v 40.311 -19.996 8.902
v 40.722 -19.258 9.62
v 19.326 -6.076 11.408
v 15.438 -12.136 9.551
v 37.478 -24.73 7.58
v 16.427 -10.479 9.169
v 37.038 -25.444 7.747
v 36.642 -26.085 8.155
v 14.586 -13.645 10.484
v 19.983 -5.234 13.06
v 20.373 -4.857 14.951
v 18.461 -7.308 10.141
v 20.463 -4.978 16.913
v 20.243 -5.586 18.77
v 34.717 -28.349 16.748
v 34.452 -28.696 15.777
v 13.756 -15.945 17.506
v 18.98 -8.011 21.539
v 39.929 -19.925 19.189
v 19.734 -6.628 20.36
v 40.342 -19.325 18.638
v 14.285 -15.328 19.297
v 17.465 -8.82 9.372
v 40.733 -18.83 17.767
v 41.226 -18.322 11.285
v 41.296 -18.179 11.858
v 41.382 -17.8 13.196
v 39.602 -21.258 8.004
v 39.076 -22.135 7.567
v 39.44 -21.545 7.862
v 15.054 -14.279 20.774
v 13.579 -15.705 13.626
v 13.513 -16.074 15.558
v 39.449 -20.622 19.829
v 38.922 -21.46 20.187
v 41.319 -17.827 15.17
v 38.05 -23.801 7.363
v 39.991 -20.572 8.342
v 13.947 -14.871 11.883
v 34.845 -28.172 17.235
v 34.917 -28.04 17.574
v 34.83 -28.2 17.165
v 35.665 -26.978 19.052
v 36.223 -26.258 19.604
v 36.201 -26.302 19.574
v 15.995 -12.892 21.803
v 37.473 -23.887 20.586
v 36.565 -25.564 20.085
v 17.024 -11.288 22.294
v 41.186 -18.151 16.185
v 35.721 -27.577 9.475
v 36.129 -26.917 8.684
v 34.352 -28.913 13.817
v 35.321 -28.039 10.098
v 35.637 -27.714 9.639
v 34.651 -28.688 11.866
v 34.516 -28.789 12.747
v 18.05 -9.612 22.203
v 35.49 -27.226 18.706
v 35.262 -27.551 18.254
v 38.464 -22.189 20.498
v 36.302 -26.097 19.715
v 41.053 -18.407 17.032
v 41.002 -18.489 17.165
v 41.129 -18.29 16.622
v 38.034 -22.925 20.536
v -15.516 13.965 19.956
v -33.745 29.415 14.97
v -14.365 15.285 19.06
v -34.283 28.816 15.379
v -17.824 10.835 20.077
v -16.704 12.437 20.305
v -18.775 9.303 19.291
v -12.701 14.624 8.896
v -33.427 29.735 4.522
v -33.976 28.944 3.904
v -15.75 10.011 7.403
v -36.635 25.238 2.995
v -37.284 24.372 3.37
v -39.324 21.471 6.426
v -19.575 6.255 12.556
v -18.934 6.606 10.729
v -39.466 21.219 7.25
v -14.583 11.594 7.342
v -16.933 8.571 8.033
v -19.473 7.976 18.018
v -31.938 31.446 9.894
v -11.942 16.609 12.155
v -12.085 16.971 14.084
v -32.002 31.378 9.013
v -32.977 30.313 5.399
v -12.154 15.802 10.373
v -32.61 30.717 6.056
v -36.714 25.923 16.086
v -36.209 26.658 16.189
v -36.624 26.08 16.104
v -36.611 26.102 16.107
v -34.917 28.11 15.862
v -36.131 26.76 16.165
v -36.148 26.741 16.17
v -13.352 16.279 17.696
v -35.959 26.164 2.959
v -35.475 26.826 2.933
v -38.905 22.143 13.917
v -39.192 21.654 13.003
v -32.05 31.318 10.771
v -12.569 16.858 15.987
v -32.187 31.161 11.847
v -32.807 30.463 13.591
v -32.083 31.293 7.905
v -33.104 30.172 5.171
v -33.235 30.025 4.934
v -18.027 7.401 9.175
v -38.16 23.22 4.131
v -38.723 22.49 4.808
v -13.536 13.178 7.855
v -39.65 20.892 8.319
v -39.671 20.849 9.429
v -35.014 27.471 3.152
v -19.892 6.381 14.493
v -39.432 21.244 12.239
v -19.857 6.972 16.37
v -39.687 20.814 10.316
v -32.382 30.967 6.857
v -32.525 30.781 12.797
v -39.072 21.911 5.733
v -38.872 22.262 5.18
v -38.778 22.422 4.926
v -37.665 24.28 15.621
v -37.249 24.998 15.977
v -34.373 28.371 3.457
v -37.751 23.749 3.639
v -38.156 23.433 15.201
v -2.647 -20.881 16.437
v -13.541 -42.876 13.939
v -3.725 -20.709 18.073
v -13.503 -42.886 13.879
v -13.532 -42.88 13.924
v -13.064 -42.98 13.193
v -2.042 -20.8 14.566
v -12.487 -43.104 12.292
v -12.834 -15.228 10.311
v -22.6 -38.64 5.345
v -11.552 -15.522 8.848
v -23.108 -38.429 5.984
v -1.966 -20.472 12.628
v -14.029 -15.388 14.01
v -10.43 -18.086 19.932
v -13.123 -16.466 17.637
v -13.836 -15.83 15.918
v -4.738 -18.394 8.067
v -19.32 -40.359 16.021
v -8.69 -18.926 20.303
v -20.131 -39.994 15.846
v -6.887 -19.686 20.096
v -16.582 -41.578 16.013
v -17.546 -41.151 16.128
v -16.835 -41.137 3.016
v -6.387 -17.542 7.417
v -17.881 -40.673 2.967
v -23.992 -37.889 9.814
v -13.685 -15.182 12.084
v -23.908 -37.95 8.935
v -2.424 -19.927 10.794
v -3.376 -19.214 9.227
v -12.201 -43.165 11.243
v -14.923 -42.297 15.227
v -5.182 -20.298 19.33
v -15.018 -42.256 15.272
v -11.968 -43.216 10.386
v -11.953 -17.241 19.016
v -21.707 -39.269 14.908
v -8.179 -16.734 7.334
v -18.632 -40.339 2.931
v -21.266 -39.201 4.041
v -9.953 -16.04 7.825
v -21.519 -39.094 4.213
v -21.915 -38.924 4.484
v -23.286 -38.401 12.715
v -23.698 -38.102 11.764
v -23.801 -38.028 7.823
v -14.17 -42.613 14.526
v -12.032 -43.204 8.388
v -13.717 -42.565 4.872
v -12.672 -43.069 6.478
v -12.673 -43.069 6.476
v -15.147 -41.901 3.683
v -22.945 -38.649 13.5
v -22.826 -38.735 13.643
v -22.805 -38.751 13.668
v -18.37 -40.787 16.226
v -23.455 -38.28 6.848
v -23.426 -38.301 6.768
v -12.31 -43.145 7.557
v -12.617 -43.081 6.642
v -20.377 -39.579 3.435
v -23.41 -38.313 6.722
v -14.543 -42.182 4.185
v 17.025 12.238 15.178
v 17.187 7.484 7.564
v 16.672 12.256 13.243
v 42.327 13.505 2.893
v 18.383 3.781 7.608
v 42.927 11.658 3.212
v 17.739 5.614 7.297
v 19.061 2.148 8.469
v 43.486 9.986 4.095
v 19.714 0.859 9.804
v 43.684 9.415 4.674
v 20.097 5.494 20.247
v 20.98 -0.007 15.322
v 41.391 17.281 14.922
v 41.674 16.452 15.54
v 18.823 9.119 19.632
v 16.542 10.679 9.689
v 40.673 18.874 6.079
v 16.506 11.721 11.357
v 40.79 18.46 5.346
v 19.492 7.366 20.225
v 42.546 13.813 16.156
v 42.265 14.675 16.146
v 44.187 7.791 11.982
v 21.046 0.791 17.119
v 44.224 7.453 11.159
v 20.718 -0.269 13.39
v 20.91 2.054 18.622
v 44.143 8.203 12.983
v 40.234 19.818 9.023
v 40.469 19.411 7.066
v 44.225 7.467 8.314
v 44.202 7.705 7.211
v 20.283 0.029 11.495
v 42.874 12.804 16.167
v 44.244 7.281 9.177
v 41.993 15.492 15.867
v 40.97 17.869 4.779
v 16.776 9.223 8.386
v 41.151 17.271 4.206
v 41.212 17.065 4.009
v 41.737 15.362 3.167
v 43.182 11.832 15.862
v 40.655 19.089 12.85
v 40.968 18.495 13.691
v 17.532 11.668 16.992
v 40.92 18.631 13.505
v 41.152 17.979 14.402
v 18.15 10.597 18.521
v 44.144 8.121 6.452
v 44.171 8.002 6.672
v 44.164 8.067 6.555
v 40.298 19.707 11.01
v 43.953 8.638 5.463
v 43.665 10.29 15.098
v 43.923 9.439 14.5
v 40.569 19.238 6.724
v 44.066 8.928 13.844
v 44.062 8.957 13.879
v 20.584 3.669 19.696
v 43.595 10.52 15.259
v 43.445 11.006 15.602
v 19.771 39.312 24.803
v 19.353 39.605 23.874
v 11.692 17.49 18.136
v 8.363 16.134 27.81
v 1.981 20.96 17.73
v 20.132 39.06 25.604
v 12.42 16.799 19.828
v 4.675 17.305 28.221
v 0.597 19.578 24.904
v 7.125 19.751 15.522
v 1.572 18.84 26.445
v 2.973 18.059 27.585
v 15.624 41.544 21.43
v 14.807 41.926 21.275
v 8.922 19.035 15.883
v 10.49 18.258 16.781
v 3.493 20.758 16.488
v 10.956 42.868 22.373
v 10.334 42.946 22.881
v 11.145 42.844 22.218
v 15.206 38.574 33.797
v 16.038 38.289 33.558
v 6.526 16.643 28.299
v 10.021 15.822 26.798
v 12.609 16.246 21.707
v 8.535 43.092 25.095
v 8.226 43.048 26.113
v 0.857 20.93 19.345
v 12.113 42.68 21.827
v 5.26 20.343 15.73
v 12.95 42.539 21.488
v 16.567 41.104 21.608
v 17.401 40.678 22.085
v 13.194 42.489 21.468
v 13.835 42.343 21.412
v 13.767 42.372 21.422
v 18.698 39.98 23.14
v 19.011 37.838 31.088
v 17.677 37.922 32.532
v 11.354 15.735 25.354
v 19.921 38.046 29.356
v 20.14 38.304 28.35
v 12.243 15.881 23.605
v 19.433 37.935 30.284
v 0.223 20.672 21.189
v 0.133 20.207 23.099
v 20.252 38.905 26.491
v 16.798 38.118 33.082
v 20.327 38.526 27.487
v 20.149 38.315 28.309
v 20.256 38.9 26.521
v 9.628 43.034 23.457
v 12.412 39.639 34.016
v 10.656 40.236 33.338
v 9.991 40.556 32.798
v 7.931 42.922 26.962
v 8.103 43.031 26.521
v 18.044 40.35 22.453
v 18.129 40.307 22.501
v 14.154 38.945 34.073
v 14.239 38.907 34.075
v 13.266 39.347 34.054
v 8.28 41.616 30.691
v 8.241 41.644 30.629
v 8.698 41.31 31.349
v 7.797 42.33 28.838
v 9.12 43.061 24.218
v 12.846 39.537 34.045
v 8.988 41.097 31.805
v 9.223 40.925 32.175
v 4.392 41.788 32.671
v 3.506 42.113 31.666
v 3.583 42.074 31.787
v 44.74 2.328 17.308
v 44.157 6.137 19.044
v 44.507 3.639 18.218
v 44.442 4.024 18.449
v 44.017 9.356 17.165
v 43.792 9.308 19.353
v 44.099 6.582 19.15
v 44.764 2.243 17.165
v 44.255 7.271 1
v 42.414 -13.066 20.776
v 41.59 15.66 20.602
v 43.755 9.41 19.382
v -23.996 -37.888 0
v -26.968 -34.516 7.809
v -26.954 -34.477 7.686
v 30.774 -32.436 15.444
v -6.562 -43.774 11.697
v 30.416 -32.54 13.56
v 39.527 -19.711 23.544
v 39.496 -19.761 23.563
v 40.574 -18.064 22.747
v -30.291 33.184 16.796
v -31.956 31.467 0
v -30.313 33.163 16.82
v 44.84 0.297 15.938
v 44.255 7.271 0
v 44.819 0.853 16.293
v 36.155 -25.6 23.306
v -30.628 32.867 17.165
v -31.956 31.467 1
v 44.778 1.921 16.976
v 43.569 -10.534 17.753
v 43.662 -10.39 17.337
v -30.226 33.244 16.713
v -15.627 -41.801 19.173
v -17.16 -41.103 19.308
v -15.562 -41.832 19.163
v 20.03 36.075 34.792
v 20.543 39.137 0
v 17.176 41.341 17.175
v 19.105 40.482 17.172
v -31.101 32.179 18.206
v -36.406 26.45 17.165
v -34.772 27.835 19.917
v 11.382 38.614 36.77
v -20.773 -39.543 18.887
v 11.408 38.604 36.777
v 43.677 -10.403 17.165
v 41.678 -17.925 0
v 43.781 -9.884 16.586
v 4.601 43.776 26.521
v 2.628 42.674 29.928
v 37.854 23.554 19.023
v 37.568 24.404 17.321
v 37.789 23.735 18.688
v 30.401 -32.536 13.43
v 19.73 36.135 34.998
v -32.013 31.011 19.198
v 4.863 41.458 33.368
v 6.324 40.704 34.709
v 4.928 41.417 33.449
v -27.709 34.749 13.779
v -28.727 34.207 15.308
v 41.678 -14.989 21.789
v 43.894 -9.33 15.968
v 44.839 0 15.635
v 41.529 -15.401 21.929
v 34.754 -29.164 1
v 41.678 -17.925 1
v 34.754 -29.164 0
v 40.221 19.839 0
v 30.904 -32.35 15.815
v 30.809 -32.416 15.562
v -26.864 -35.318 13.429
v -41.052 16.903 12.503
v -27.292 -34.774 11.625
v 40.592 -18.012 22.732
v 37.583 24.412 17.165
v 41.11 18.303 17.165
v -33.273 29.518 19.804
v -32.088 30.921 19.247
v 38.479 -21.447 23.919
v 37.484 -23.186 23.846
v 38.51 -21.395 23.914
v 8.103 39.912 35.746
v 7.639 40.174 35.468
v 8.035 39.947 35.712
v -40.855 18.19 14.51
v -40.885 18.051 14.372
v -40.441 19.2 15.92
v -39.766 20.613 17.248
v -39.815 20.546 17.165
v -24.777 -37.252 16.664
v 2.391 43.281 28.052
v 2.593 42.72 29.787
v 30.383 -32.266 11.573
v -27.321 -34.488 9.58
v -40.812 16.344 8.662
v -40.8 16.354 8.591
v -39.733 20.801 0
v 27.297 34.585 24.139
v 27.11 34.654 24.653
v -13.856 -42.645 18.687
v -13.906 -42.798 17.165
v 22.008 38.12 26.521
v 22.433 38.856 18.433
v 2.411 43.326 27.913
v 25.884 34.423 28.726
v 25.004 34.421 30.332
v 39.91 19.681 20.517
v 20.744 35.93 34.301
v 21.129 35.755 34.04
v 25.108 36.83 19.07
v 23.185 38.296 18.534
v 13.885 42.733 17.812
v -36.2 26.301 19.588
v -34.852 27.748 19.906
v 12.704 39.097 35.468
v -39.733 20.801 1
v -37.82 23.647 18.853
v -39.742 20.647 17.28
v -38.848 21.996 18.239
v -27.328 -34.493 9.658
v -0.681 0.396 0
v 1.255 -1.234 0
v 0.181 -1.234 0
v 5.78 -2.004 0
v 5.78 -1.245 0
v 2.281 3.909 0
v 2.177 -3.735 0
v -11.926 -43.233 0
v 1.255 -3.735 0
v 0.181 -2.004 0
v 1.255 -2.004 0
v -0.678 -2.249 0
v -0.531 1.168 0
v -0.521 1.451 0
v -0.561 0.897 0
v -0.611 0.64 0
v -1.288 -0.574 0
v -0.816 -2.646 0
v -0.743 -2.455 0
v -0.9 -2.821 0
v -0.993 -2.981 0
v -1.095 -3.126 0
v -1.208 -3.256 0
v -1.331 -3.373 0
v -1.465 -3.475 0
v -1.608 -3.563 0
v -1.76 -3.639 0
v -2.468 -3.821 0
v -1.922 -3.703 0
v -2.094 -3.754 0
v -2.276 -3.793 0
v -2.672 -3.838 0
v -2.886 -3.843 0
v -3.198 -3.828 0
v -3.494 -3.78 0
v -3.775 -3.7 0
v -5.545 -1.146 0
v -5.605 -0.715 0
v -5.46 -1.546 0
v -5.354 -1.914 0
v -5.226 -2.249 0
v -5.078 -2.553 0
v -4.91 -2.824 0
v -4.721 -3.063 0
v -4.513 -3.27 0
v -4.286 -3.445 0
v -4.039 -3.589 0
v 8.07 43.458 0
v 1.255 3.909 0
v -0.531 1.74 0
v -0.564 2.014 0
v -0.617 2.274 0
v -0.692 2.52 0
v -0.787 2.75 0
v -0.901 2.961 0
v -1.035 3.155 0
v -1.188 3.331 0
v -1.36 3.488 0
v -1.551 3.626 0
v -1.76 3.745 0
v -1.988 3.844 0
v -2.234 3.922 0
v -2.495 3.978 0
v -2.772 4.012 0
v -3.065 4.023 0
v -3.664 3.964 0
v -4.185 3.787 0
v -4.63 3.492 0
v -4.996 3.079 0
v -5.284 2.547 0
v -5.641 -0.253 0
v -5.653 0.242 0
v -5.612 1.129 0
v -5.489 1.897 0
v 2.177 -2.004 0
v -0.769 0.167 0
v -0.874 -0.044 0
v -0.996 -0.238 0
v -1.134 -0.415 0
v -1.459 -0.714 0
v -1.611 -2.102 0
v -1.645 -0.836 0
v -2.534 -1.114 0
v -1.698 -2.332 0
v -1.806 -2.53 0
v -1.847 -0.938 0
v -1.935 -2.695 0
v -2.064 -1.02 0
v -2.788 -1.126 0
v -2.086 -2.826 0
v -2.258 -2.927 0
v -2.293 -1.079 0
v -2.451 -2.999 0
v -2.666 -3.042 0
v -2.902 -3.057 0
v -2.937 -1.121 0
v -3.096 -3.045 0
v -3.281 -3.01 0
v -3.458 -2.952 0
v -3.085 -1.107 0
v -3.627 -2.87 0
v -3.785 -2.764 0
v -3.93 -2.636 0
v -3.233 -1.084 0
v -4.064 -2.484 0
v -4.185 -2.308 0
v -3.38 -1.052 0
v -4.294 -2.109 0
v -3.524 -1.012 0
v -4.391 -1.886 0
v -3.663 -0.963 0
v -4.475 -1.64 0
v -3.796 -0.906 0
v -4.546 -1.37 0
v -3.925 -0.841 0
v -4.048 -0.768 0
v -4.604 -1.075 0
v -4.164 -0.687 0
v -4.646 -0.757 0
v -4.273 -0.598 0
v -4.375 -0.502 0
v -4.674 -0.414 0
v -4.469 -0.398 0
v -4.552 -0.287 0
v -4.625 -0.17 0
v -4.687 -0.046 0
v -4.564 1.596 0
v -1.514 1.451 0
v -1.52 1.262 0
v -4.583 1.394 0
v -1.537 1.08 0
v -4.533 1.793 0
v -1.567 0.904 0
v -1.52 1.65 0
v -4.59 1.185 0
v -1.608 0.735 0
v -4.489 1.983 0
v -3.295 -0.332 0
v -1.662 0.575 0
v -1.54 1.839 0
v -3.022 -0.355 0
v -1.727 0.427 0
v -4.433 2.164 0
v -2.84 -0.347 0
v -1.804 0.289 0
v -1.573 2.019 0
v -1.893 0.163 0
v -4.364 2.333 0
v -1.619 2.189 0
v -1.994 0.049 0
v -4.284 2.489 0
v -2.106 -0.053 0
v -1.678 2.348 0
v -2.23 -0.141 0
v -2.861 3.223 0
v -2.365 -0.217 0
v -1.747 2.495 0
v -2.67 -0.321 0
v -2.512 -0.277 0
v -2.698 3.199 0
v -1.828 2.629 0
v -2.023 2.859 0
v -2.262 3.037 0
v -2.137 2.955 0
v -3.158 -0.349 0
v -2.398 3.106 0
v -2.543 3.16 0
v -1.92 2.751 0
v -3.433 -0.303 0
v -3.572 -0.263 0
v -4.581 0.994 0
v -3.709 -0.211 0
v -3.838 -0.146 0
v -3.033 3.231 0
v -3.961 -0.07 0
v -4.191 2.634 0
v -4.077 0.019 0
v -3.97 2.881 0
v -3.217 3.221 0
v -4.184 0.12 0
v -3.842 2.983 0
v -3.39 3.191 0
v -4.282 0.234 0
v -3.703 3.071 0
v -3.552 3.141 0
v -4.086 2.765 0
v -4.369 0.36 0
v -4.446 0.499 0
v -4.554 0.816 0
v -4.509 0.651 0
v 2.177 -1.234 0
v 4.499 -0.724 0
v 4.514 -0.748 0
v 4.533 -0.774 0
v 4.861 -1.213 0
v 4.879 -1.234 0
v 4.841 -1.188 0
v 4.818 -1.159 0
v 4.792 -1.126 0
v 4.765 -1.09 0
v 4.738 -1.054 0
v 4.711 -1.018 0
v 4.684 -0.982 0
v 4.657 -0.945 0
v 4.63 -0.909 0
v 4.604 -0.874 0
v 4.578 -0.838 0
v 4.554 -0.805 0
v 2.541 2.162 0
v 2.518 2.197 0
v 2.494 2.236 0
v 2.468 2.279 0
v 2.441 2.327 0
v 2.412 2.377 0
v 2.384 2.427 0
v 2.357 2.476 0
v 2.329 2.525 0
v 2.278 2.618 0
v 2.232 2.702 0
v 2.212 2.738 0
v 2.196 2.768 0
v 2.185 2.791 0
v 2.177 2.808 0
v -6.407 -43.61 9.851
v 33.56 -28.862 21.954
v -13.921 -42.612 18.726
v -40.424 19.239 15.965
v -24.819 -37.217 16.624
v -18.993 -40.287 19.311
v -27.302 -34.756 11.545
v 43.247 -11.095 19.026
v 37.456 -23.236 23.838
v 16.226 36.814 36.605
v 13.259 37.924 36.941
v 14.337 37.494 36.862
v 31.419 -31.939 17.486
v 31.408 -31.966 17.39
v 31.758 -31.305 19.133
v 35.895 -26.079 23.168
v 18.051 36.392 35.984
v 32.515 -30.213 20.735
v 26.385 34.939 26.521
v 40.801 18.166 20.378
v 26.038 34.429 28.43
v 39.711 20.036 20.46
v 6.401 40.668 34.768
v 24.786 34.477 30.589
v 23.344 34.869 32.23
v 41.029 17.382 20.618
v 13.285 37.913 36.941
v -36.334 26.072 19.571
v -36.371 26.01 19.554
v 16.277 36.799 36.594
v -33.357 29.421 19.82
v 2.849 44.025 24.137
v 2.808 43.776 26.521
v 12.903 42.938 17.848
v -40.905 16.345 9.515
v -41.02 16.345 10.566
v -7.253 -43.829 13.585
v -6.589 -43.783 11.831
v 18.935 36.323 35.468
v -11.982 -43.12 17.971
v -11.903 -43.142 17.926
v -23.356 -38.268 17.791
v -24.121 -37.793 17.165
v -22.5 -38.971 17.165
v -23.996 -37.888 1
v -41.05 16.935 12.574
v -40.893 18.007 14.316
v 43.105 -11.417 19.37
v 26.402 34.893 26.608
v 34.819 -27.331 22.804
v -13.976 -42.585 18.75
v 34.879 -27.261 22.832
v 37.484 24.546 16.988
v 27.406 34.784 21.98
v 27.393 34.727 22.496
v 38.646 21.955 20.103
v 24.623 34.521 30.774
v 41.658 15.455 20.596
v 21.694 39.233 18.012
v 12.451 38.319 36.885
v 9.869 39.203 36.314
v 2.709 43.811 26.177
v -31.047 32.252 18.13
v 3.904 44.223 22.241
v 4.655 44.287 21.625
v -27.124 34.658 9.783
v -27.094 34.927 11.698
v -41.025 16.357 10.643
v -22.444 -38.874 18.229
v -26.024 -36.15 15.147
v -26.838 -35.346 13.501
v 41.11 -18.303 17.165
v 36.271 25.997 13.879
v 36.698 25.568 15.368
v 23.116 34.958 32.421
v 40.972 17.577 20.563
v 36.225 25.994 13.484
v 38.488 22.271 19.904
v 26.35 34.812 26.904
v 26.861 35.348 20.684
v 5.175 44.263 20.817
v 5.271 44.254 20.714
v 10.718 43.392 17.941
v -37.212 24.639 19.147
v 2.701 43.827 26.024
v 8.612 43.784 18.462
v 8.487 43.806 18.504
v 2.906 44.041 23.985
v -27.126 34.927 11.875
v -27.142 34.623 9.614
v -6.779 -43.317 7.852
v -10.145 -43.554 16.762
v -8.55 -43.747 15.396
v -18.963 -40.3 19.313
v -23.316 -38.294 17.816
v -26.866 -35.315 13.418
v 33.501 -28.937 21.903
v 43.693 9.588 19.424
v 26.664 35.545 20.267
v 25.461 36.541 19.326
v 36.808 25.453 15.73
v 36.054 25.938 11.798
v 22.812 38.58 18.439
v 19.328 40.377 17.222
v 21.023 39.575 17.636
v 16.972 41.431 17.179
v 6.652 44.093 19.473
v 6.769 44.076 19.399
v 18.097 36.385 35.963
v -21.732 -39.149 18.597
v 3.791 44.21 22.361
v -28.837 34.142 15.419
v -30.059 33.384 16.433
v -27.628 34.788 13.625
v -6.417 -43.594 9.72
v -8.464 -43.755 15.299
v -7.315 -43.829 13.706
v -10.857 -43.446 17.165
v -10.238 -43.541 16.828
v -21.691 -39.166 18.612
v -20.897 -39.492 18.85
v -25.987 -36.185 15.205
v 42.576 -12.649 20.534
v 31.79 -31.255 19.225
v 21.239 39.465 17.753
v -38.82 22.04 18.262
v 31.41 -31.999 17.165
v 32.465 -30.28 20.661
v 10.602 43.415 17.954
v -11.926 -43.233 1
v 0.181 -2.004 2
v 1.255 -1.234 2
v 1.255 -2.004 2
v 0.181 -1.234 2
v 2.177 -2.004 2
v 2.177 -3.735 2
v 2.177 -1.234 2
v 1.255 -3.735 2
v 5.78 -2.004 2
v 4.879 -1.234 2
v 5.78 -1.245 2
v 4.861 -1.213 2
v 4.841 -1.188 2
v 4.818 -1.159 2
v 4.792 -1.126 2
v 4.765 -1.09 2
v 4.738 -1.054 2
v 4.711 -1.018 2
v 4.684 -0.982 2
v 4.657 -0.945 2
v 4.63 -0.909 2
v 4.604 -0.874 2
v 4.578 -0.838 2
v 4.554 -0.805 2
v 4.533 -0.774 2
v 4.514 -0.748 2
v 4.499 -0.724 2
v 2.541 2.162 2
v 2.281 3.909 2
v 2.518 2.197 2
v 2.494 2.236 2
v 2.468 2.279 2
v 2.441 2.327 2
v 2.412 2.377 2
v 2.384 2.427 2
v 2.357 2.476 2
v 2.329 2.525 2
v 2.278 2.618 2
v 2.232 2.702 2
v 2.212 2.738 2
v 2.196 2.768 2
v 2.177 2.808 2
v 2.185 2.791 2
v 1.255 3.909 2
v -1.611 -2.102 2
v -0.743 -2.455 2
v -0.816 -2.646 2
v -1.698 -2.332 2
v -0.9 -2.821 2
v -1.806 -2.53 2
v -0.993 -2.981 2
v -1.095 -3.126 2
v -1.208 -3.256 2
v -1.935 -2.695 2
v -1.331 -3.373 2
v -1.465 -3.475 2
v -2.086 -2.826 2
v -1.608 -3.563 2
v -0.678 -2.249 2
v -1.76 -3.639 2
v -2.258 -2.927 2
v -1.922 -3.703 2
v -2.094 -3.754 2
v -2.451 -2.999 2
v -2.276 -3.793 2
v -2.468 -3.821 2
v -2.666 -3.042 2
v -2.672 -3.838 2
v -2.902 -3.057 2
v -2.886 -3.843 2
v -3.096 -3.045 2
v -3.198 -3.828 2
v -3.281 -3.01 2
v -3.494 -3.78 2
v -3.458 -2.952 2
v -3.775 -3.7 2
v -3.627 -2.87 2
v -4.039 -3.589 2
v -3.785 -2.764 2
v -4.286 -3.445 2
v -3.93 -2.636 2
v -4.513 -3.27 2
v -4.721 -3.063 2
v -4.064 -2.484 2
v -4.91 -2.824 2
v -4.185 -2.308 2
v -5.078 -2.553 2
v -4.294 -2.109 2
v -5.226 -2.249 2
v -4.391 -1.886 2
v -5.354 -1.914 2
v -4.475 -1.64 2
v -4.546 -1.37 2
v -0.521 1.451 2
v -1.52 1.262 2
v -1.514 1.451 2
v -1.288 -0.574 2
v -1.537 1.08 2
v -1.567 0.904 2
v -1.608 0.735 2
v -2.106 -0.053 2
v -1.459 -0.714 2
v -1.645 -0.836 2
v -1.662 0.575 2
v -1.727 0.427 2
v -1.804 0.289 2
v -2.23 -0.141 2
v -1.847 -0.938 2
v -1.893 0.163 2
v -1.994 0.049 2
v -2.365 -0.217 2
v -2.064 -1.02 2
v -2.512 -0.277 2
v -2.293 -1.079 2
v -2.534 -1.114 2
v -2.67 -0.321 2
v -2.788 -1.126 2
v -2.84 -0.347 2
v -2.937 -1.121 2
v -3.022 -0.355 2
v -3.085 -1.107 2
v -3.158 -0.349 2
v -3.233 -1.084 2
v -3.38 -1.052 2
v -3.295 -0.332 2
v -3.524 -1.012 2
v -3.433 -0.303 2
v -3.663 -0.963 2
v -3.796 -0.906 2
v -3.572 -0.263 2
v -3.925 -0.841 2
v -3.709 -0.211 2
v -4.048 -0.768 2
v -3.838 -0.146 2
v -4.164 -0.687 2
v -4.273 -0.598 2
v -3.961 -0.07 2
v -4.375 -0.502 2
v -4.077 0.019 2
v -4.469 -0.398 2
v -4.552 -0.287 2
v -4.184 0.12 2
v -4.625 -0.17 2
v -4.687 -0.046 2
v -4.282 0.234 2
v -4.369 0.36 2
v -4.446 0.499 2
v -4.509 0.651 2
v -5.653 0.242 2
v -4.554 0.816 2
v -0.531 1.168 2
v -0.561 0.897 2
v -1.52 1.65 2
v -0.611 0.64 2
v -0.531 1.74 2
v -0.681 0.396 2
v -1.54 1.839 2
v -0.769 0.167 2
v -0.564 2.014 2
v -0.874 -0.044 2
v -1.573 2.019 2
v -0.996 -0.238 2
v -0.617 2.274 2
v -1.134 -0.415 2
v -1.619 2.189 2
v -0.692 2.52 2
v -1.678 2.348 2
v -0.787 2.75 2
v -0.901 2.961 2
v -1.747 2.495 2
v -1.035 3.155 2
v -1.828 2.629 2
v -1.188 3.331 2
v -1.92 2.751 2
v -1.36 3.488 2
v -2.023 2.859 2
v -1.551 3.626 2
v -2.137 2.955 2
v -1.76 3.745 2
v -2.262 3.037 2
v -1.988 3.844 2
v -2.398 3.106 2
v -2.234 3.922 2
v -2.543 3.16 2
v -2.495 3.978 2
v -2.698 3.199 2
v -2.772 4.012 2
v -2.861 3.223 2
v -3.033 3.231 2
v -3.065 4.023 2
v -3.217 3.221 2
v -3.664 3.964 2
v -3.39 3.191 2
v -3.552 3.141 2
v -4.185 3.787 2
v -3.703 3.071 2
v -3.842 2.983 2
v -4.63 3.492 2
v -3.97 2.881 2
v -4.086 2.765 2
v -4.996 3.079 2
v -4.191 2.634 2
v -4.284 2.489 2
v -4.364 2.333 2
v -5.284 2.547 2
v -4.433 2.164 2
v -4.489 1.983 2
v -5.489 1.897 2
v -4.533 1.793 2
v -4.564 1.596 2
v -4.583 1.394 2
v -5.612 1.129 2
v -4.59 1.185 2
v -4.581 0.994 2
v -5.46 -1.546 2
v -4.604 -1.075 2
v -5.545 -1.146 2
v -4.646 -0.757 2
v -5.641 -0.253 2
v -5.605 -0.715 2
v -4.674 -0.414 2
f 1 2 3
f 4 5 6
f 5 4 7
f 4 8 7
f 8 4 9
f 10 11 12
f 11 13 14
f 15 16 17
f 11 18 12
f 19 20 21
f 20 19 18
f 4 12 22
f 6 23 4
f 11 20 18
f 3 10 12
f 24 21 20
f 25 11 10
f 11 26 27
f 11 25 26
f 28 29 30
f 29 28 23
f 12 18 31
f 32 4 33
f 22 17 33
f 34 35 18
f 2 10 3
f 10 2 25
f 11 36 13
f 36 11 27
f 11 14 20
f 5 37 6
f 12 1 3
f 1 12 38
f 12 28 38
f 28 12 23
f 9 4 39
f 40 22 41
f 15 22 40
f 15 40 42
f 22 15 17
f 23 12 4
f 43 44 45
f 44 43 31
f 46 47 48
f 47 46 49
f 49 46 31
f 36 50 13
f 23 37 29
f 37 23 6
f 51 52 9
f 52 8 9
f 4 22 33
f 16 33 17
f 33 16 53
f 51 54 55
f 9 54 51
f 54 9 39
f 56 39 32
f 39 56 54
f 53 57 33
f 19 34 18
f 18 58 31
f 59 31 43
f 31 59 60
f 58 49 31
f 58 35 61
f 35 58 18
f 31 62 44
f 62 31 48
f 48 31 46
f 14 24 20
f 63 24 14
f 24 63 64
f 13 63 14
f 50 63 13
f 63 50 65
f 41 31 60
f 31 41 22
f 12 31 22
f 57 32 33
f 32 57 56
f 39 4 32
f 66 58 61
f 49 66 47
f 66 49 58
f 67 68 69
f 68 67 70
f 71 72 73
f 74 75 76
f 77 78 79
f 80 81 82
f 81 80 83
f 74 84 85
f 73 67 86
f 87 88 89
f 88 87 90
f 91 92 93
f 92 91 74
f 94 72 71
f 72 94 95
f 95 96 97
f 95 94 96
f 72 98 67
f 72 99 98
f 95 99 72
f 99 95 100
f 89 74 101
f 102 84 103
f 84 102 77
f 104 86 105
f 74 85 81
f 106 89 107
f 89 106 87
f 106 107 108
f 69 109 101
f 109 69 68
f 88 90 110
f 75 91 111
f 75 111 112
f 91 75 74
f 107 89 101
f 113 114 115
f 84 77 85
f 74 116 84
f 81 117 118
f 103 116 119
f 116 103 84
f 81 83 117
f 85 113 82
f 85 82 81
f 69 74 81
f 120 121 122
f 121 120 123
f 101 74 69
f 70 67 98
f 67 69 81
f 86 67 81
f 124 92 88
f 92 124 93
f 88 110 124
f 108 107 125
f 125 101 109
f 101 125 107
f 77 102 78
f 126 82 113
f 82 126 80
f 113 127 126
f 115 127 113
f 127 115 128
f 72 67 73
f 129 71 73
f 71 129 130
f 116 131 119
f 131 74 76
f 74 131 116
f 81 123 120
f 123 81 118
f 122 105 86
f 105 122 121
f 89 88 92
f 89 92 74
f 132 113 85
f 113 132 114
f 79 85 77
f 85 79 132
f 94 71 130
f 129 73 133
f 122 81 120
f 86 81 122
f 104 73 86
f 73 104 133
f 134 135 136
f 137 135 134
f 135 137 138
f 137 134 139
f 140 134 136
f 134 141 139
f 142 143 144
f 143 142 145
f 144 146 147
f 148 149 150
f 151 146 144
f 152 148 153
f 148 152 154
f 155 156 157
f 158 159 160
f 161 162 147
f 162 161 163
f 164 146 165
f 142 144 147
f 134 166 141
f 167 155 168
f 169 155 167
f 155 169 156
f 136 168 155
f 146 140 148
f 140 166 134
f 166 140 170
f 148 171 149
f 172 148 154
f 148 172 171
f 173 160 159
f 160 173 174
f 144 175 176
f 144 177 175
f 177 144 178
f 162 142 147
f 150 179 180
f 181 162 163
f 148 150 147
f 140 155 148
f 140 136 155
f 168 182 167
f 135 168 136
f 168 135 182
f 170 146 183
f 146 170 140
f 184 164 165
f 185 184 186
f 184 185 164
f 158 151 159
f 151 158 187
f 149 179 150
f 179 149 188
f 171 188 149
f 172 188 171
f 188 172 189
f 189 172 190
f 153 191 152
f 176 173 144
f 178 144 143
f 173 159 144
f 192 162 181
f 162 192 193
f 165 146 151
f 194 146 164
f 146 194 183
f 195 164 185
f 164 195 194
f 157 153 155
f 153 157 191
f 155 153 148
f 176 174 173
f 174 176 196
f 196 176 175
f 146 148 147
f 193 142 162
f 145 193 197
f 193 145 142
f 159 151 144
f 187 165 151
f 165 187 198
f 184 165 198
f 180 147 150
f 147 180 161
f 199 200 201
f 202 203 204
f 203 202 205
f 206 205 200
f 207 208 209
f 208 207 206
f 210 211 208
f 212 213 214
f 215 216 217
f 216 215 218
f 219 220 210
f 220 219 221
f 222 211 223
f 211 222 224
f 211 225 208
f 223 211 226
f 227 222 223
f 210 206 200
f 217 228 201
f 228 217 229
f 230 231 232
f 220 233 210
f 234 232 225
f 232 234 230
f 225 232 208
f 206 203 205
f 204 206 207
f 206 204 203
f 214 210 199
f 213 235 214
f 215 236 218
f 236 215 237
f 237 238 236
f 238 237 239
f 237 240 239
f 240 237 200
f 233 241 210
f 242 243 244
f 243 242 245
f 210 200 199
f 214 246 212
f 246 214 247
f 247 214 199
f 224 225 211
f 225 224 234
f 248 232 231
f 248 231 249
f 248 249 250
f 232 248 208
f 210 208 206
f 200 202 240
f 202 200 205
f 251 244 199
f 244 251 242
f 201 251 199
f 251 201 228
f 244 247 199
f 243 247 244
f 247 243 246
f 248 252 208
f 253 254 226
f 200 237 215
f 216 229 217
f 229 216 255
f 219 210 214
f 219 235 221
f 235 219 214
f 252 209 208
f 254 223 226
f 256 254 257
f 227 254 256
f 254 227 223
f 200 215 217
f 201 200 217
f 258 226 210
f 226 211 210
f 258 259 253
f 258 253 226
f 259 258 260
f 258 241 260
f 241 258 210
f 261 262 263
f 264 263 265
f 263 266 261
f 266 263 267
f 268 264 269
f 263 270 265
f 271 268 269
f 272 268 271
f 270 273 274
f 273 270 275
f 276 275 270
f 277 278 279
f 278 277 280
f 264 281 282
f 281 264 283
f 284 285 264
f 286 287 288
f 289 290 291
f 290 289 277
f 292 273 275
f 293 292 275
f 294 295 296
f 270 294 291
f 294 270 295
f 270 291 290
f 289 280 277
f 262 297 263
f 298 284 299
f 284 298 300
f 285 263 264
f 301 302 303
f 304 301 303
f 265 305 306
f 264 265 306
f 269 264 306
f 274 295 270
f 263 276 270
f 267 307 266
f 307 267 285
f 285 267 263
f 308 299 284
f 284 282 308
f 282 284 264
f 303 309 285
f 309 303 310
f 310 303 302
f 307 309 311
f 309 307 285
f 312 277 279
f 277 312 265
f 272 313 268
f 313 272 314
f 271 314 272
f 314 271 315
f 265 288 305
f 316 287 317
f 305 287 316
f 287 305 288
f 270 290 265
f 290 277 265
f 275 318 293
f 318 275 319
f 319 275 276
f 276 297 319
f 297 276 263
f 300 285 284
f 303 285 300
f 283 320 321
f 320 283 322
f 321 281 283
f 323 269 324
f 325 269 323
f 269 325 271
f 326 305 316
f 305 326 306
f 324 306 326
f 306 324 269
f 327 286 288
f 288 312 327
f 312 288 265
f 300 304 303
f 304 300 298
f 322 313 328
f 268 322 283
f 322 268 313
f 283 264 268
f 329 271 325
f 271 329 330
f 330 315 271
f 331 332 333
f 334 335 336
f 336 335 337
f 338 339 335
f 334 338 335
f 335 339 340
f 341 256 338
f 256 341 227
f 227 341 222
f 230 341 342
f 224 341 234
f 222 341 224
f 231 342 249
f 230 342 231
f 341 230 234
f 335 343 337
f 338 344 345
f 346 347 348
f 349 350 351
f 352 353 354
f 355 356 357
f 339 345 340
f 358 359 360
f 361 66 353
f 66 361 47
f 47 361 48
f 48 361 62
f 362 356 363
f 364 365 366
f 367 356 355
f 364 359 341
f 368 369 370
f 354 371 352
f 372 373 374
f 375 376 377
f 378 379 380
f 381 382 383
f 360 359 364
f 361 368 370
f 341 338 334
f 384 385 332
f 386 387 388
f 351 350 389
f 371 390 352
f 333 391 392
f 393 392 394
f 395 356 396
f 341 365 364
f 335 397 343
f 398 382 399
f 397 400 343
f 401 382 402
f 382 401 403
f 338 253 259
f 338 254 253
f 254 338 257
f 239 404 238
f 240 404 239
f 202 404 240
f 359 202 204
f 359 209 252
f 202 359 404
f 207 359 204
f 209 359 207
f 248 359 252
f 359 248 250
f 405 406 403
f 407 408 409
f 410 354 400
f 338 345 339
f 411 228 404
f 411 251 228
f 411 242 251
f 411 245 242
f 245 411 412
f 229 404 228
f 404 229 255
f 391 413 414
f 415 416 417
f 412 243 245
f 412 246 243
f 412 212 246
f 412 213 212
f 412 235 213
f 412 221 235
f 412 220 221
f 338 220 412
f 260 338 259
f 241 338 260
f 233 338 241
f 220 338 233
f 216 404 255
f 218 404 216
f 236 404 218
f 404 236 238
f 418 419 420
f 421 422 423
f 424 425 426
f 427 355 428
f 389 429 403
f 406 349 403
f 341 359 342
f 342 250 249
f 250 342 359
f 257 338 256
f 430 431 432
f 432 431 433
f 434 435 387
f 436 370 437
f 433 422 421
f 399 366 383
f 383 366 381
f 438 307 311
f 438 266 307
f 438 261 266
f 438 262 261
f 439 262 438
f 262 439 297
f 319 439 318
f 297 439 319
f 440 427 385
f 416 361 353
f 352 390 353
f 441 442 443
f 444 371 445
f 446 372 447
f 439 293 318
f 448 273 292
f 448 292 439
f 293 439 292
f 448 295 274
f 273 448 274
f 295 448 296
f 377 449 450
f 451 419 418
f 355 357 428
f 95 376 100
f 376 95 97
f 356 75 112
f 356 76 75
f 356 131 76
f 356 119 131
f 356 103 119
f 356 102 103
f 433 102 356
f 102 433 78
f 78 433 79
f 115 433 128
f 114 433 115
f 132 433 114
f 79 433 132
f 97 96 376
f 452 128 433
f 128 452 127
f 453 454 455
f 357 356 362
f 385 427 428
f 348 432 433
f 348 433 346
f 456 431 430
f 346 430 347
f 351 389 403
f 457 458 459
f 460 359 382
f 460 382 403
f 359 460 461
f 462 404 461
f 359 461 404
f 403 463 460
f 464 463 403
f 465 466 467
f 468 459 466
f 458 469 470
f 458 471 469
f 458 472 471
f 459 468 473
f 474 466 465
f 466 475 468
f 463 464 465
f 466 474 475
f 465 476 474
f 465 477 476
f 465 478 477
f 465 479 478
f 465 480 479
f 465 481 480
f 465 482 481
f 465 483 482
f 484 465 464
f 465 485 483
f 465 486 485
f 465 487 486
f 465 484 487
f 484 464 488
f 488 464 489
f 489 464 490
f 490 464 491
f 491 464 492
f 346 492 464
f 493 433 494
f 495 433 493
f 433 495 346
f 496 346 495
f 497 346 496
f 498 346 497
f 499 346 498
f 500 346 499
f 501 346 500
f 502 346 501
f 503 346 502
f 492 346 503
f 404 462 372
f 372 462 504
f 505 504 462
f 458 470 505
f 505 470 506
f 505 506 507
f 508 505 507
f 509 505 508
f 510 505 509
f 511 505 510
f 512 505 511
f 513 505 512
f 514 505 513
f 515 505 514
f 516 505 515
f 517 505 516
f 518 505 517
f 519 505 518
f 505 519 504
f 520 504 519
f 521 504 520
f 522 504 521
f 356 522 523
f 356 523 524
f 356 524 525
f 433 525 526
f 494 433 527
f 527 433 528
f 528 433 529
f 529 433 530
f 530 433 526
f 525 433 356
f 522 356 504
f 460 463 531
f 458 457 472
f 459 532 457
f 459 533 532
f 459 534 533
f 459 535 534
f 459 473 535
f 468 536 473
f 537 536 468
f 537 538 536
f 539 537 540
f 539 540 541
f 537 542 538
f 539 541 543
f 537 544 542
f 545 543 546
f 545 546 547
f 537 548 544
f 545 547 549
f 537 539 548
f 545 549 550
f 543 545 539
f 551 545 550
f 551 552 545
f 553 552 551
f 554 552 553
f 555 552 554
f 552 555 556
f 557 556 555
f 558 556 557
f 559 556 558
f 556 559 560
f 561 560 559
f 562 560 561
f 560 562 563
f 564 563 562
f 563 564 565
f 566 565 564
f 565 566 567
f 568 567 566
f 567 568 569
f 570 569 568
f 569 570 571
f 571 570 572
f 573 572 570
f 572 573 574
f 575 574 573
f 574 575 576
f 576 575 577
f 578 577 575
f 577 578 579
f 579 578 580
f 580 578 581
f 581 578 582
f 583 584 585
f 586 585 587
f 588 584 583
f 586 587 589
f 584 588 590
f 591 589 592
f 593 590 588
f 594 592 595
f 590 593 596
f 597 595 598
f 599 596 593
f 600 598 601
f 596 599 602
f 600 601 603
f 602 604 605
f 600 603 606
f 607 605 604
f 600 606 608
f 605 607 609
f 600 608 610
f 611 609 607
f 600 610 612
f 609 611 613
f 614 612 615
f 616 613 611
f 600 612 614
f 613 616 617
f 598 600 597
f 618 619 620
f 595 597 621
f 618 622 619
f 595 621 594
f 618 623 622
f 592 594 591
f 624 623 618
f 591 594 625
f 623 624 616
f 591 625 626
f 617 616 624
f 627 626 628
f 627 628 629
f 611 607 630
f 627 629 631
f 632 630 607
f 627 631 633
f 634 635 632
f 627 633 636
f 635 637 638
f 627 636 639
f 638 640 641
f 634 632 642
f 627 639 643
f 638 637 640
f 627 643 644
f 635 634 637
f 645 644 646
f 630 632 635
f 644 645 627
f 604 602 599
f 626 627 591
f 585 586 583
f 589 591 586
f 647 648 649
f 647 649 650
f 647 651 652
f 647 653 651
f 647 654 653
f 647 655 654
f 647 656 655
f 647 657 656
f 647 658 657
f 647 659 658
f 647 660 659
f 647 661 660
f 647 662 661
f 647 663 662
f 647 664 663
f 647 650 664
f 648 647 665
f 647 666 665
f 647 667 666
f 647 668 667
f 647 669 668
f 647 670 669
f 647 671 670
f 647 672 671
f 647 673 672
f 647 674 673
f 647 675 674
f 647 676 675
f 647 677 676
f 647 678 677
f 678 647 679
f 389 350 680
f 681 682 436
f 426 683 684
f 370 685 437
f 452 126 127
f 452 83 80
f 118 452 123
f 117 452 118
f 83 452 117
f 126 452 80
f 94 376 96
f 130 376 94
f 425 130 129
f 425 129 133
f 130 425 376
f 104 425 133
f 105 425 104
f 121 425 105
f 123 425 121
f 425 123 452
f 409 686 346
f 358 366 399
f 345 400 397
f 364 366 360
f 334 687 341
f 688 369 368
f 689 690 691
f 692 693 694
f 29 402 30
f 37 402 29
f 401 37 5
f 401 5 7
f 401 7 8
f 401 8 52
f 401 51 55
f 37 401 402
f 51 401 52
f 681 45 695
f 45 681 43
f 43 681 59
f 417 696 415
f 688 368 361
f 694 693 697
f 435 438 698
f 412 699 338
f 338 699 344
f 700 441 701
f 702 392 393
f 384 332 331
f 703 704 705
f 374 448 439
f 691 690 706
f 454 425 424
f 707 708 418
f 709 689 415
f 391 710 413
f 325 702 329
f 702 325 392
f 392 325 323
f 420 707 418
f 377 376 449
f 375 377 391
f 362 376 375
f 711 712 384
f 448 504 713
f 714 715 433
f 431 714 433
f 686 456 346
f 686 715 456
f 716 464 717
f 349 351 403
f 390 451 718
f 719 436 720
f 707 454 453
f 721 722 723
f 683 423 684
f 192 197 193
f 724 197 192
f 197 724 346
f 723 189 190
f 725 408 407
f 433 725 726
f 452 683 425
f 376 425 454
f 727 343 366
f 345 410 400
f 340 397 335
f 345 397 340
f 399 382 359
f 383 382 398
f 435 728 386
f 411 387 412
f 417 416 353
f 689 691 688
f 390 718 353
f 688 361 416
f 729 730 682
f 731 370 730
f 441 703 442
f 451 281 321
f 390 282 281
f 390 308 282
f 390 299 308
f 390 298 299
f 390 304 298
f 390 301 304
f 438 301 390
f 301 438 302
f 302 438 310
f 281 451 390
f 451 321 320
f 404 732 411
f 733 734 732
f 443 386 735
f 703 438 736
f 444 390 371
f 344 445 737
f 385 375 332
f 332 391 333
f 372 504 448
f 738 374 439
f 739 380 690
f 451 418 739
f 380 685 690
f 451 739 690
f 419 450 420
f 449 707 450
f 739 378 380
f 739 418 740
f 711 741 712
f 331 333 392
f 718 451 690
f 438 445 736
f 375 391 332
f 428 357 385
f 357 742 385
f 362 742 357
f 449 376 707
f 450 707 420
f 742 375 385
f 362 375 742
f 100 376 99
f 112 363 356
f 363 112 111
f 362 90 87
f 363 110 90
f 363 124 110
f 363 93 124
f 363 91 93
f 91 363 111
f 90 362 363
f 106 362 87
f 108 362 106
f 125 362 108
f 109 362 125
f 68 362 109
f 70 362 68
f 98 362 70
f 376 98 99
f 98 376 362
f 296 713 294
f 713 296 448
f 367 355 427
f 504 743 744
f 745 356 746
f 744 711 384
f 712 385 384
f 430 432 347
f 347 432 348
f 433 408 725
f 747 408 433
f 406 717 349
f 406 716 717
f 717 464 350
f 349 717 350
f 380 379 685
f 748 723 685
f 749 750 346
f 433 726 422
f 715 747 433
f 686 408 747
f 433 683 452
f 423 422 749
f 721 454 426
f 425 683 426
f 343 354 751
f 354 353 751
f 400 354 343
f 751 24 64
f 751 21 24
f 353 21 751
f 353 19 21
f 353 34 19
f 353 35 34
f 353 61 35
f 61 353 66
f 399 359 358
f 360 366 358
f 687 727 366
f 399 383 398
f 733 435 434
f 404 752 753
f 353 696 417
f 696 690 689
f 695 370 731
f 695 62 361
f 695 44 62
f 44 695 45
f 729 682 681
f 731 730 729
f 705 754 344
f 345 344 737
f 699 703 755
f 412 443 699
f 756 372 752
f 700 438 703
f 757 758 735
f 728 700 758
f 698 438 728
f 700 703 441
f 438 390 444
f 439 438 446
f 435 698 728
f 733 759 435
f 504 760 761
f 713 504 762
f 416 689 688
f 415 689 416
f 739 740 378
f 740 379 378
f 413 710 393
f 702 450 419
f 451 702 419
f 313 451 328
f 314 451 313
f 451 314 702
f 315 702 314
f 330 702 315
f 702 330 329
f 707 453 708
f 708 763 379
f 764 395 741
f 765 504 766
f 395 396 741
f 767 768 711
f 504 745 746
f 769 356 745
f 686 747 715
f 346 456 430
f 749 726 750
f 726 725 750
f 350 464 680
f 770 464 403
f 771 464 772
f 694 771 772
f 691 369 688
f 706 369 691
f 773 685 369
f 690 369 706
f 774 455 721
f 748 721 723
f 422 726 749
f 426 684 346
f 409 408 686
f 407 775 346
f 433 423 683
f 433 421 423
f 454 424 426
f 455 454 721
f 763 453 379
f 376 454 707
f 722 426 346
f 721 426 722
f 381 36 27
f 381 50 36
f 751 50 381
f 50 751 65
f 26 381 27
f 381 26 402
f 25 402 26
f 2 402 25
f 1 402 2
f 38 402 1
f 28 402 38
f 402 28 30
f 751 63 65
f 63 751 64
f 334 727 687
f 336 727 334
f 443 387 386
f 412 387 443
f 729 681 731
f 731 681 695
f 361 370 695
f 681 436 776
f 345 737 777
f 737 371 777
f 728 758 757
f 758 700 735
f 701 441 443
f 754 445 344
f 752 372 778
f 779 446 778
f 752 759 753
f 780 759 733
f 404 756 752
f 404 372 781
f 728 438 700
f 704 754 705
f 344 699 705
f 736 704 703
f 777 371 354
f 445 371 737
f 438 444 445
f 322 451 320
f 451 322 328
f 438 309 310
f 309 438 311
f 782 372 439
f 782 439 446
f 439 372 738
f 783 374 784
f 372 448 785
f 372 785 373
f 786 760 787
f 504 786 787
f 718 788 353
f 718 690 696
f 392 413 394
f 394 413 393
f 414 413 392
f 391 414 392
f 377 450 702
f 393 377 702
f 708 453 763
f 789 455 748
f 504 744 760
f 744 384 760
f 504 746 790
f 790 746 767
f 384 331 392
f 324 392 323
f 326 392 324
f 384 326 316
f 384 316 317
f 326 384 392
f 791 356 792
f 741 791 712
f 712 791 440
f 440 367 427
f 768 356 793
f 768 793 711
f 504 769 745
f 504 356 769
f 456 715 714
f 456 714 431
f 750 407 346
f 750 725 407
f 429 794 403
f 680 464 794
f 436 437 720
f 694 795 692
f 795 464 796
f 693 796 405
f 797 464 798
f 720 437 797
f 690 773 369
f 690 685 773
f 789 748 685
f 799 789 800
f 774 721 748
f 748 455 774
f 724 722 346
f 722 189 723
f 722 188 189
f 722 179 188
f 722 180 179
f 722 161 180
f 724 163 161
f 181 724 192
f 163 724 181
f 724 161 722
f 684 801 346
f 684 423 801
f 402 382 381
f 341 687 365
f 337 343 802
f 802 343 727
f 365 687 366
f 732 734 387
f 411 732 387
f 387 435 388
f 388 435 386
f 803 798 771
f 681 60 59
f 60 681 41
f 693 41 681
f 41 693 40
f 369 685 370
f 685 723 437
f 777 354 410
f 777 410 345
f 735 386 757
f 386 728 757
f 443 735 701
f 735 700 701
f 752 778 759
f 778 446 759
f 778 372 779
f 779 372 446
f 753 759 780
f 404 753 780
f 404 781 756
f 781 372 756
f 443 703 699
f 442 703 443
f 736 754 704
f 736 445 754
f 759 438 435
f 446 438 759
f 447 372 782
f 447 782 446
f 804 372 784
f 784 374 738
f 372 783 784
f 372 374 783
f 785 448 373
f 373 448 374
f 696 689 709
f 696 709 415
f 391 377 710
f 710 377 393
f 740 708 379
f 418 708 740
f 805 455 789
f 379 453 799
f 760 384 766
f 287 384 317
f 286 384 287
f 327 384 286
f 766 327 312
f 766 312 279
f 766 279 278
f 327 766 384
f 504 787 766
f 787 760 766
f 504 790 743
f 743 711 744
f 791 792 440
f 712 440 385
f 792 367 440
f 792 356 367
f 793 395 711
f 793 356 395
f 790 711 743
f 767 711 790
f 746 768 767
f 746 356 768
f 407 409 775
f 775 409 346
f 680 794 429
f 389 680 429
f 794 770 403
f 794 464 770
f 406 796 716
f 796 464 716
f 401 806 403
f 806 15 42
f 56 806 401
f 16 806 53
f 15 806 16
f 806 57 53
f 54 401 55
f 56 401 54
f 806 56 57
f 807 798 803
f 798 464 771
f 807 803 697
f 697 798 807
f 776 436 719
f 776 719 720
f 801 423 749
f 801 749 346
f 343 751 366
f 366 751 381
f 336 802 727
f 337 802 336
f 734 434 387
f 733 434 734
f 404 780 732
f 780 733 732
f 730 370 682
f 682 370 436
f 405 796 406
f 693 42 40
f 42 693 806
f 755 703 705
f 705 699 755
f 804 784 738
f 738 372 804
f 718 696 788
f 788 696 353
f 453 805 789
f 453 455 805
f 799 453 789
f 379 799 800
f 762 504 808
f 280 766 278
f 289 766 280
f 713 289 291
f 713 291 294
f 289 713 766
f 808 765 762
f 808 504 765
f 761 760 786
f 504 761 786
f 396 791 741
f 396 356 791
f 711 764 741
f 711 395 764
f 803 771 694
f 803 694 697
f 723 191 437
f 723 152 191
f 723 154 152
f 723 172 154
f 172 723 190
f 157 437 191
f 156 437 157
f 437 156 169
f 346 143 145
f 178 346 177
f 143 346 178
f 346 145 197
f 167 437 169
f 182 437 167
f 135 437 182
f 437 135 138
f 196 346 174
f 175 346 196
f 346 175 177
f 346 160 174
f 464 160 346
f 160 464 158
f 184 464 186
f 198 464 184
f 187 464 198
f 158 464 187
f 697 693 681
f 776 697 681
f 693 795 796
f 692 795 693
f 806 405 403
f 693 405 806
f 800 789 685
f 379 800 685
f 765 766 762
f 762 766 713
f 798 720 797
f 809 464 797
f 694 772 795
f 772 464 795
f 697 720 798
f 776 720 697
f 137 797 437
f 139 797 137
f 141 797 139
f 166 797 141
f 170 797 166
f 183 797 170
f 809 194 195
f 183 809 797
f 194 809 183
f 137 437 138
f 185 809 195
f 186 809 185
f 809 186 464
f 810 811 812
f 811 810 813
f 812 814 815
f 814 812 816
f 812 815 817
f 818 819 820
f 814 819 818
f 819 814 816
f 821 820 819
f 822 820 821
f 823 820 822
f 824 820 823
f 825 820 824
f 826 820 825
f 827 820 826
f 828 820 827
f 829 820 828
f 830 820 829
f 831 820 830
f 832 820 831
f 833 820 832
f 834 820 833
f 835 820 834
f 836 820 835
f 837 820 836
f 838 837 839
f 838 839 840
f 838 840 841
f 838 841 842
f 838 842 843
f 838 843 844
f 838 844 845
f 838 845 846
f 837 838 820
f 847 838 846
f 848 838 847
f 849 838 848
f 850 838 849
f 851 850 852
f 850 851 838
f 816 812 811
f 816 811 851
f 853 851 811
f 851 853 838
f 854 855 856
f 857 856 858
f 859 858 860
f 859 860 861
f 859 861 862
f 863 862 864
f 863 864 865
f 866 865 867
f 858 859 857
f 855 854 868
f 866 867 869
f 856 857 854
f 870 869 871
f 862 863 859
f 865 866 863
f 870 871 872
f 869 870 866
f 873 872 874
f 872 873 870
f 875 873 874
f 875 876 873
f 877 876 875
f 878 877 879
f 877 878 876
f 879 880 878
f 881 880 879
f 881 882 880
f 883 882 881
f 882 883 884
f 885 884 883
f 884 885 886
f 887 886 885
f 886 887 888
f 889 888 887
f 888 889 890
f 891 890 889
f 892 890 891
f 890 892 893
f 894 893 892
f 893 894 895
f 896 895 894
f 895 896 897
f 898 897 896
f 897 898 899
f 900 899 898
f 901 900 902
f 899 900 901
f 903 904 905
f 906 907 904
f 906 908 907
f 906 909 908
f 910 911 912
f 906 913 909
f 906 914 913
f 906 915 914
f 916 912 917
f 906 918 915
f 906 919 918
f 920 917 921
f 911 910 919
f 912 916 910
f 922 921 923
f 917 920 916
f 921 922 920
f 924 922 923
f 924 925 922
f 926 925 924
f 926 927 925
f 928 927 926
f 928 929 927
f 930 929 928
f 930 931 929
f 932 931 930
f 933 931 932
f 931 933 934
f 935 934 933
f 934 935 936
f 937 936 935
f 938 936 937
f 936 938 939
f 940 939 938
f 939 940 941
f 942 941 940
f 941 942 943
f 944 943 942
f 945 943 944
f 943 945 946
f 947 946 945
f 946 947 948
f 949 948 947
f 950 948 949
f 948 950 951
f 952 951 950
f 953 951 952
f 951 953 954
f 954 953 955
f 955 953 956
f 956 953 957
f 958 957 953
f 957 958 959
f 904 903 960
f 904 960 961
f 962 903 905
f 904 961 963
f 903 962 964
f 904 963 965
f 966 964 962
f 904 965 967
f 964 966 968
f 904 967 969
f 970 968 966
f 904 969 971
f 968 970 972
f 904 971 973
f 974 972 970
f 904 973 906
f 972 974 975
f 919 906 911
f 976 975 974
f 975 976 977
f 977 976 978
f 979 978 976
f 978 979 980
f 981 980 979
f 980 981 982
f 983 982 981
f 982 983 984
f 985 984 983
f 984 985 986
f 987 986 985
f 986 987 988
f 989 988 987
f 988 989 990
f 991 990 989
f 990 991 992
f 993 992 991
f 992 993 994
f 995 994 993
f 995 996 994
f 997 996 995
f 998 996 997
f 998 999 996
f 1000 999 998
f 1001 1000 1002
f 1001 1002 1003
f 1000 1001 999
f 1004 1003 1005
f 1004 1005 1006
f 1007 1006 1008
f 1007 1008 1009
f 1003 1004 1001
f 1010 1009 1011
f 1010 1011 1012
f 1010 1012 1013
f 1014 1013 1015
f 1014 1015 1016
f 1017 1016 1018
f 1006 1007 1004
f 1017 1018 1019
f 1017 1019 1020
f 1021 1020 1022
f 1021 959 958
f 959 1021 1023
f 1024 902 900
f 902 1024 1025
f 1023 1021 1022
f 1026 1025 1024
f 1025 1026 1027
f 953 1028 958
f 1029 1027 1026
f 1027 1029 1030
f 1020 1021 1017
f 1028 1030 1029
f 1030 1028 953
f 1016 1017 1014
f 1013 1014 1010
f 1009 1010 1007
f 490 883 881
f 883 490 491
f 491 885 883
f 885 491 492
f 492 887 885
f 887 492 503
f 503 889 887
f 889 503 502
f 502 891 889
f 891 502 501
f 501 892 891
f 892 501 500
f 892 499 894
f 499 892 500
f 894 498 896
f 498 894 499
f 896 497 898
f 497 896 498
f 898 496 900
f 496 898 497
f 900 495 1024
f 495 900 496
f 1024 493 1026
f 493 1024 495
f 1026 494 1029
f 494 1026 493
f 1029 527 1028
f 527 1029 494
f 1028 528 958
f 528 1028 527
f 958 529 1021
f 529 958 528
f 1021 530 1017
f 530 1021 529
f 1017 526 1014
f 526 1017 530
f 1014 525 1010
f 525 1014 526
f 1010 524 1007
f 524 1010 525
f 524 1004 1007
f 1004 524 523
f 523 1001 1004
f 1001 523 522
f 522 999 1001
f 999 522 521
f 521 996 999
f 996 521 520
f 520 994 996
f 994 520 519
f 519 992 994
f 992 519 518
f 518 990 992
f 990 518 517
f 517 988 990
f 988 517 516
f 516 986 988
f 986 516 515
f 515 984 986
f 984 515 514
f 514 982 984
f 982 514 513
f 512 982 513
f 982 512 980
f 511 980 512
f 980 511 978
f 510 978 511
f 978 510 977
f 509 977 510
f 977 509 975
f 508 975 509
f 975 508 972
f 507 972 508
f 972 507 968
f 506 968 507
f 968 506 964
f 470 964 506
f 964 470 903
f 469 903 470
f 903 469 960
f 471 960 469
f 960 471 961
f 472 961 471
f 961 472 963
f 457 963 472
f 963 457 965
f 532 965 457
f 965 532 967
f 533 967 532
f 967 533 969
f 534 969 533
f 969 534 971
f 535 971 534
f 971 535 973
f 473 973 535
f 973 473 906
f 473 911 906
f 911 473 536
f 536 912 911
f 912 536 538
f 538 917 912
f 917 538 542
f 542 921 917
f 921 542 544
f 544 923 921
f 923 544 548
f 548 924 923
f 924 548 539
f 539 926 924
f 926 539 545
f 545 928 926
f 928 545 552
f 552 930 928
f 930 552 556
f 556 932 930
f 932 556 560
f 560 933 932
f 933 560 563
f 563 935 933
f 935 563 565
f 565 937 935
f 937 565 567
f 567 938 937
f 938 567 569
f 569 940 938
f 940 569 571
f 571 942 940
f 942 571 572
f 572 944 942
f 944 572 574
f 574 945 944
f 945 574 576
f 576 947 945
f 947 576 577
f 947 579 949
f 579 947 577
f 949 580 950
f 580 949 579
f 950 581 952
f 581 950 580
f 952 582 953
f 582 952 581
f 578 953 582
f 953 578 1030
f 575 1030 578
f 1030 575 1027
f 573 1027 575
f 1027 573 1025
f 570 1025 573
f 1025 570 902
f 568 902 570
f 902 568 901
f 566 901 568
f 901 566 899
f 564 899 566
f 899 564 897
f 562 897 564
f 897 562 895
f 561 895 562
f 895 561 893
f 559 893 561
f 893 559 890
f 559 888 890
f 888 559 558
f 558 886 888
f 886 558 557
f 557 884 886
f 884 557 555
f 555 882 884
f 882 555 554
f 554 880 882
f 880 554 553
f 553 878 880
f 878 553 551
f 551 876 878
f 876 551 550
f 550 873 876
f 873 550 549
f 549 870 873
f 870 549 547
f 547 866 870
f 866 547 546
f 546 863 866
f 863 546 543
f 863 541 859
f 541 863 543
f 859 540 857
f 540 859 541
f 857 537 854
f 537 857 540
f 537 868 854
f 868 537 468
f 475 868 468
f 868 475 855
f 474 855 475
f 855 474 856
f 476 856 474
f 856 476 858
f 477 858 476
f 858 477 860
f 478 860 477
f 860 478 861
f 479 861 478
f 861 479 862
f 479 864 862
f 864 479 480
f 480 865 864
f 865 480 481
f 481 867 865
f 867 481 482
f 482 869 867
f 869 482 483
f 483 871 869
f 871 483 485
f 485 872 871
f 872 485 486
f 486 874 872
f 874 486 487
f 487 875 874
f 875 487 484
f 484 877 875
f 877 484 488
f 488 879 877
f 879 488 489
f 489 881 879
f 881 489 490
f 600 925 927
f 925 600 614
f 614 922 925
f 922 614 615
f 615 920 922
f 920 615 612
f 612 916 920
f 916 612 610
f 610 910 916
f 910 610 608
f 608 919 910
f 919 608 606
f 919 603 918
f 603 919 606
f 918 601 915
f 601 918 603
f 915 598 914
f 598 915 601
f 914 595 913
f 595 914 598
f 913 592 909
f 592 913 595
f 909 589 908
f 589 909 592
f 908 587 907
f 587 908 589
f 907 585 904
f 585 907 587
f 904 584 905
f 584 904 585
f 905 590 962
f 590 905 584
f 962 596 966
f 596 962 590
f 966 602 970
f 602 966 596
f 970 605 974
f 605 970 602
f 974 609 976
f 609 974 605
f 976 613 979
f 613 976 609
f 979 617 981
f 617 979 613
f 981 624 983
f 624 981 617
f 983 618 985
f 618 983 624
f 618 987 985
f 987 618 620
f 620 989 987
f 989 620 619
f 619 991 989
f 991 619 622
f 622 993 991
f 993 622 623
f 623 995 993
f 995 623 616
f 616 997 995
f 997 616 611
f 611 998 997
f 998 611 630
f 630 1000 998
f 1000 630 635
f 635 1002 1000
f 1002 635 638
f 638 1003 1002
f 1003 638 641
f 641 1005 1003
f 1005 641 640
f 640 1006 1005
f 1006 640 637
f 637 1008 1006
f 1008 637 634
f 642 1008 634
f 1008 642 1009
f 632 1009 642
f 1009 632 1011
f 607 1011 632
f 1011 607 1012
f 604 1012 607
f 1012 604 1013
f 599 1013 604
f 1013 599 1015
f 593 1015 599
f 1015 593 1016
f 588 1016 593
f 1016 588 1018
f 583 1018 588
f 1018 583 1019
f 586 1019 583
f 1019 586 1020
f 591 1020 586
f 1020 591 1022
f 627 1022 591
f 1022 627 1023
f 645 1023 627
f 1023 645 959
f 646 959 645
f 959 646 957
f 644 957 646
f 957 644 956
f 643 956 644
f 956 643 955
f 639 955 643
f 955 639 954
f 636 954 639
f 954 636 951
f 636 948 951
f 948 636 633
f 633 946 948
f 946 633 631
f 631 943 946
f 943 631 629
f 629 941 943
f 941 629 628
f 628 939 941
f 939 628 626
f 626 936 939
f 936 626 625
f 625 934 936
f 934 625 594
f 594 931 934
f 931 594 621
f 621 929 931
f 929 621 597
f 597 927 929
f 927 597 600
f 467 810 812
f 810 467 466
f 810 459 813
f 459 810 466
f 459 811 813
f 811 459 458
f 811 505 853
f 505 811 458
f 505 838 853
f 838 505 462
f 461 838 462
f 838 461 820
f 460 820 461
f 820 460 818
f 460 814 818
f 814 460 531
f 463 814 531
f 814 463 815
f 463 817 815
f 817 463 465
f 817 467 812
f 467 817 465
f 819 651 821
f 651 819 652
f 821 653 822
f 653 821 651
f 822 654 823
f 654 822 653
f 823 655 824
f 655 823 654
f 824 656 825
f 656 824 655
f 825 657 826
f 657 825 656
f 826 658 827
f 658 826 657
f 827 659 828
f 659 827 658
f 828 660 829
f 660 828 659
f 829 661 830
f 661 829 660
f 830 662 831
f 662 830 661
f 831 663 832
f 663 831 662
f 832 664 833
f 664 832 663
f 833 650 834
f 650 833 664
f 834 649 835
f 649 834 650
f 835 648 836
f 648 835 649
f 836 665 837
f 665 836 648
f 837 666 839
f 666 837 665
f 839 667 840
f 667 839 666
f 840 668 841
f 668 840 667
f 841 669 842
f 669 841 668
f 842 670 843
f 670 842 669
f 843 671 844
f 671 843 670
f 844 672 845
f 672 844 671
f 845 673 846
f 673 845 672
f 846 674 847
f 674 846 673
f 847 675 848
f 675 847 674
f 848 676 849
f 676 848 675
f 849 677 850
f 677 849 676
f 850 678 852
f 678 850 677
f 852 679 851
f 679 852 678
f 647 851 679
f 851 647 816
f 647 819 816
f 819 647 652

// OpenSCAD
difference() {
	difference() {
		difference() {
			hull() {
				union() {
					union() {
						rotate(a = -31.6369333899, v = [0, 0, 1]) {
							translate(v = [0, -6.6000000000, 0]) {
								cube(size = [44.8866131056, 13.2000000000, 1]);
							}
						}
						rotate(a = 143.9046510253, v = [0, 0, 1]) {
							translate(v = [0, -6.6000000000, 0]) {
								cube(size = [44.3596188036, 13.2000000000, 1]);
							}
						}
						rotate(a = -113.8845548345, v = [0, 0, 1]) {
							translate(v = [0, -6.6000000000, 0]) {
								cube(size = [44.3596179712, 13.2000000000, 1]);
							}
						}
						rotate(a = 17.7926704955, v = [0, 0, 1]) {
							translate(v = [0, -6.6000000000, 0]) {
								cube(size = [44.3596199206, 13.2000000000, 1]);
							}
						}
						rotate(a = 70.8924327173, v = [0, 0, 1]) {
							translate(v = [0, -6.6000000000, 0]) {
								cube(size = [43.7058729646, 13.2000000000, 1]);
							}
						}
					}
					translate(v = [0, 0, 17.1646740479]) {
						intersection() {
							hull() {
								rotate(a = 94.0681975864, v = [0.5232130822, 0.8492438097, -0.0000013725]) {
									cylinder(h = 45, r = 9.6000000000);
								}
								rotate(a = 99.6775984205, v = [-0.5807471951, -0.7965386048, 0.0000013773]) {
									cylinder(h = 45, r = 9.6000000000);
								}
								rotate(a = 99.6776677706, v = [0.9013509293, -0.3991330037, -0.0000005022]) {
									cylinder(h = 45, r = 9.6000000000);
								}
								rotate(a = 99.6775053542, v = [-0.3012251552, 0.9386186647, -0.0000006374]) {
									cylinder(h = 45, r = 9.6000000000);
								}
								rotate(a = 76.2257342225, v = [-0.9177314934, 0.3179286159, 0.0000005998]) {
									cylinder(h = 45, r = 9.6000000000);
								}
							}
							sphere(r = 45);
						}
					}
				}
			}
			translate(v = [0, 0, 17.1646740479]) {
				rotate(a = 94.0681975864, v = [0.5232130822, 0.8492438097, -0.0000013725]) {
					translate(v = [0, 0, 20]) {
						cylinder(h = 45, r = 6.6000000000);
					}
				}
				rotate(a = 99.6775984205, v = [-0.5807471951, -0.7965386048, 0.0000013773]) {
					translate(v = [0, 0, 20]) {
						cylinder(h = 45, r = 6.6000000000);
					}
				}
				rotate(a = 99.6776677706, v = [0.9013509293, -0.3991330037, -0.0000005022]) {
					translate(v = [0, 0, 20]) {
						cylinder(h = 45, r = 6.6000000000);
					}
				}
				rotate(a = 99.6775053542, v = [-0.3012251552, 0.9386186647, -0.0000006374]) {
					translate(v = [0, 0, 20]) {
						cylinder(h = 45, r = 6.6000000000);
					}
				}
				rotate(a = 76.2257342225, v = [-0.9177314934, 0.3179286159, 0.0000005998]) {
					translate(v = [0, 0, 20]) {
						cylinder(h = 45, r = 6.6000000000);
					}
				}
			}
		}
		translate(v = [-100, -100, -100]) {
			cube(size = [200, 200, 100]);
		}
	}
	translate(v = [0, 0, 2]) {
		rotate(a = 180, v = [0, 1, 0]) {
			linear_extrude(height = 3) {
				text(halign = "center", size = 8, text = "49", valign = "center");
			}
		}
	}
}
